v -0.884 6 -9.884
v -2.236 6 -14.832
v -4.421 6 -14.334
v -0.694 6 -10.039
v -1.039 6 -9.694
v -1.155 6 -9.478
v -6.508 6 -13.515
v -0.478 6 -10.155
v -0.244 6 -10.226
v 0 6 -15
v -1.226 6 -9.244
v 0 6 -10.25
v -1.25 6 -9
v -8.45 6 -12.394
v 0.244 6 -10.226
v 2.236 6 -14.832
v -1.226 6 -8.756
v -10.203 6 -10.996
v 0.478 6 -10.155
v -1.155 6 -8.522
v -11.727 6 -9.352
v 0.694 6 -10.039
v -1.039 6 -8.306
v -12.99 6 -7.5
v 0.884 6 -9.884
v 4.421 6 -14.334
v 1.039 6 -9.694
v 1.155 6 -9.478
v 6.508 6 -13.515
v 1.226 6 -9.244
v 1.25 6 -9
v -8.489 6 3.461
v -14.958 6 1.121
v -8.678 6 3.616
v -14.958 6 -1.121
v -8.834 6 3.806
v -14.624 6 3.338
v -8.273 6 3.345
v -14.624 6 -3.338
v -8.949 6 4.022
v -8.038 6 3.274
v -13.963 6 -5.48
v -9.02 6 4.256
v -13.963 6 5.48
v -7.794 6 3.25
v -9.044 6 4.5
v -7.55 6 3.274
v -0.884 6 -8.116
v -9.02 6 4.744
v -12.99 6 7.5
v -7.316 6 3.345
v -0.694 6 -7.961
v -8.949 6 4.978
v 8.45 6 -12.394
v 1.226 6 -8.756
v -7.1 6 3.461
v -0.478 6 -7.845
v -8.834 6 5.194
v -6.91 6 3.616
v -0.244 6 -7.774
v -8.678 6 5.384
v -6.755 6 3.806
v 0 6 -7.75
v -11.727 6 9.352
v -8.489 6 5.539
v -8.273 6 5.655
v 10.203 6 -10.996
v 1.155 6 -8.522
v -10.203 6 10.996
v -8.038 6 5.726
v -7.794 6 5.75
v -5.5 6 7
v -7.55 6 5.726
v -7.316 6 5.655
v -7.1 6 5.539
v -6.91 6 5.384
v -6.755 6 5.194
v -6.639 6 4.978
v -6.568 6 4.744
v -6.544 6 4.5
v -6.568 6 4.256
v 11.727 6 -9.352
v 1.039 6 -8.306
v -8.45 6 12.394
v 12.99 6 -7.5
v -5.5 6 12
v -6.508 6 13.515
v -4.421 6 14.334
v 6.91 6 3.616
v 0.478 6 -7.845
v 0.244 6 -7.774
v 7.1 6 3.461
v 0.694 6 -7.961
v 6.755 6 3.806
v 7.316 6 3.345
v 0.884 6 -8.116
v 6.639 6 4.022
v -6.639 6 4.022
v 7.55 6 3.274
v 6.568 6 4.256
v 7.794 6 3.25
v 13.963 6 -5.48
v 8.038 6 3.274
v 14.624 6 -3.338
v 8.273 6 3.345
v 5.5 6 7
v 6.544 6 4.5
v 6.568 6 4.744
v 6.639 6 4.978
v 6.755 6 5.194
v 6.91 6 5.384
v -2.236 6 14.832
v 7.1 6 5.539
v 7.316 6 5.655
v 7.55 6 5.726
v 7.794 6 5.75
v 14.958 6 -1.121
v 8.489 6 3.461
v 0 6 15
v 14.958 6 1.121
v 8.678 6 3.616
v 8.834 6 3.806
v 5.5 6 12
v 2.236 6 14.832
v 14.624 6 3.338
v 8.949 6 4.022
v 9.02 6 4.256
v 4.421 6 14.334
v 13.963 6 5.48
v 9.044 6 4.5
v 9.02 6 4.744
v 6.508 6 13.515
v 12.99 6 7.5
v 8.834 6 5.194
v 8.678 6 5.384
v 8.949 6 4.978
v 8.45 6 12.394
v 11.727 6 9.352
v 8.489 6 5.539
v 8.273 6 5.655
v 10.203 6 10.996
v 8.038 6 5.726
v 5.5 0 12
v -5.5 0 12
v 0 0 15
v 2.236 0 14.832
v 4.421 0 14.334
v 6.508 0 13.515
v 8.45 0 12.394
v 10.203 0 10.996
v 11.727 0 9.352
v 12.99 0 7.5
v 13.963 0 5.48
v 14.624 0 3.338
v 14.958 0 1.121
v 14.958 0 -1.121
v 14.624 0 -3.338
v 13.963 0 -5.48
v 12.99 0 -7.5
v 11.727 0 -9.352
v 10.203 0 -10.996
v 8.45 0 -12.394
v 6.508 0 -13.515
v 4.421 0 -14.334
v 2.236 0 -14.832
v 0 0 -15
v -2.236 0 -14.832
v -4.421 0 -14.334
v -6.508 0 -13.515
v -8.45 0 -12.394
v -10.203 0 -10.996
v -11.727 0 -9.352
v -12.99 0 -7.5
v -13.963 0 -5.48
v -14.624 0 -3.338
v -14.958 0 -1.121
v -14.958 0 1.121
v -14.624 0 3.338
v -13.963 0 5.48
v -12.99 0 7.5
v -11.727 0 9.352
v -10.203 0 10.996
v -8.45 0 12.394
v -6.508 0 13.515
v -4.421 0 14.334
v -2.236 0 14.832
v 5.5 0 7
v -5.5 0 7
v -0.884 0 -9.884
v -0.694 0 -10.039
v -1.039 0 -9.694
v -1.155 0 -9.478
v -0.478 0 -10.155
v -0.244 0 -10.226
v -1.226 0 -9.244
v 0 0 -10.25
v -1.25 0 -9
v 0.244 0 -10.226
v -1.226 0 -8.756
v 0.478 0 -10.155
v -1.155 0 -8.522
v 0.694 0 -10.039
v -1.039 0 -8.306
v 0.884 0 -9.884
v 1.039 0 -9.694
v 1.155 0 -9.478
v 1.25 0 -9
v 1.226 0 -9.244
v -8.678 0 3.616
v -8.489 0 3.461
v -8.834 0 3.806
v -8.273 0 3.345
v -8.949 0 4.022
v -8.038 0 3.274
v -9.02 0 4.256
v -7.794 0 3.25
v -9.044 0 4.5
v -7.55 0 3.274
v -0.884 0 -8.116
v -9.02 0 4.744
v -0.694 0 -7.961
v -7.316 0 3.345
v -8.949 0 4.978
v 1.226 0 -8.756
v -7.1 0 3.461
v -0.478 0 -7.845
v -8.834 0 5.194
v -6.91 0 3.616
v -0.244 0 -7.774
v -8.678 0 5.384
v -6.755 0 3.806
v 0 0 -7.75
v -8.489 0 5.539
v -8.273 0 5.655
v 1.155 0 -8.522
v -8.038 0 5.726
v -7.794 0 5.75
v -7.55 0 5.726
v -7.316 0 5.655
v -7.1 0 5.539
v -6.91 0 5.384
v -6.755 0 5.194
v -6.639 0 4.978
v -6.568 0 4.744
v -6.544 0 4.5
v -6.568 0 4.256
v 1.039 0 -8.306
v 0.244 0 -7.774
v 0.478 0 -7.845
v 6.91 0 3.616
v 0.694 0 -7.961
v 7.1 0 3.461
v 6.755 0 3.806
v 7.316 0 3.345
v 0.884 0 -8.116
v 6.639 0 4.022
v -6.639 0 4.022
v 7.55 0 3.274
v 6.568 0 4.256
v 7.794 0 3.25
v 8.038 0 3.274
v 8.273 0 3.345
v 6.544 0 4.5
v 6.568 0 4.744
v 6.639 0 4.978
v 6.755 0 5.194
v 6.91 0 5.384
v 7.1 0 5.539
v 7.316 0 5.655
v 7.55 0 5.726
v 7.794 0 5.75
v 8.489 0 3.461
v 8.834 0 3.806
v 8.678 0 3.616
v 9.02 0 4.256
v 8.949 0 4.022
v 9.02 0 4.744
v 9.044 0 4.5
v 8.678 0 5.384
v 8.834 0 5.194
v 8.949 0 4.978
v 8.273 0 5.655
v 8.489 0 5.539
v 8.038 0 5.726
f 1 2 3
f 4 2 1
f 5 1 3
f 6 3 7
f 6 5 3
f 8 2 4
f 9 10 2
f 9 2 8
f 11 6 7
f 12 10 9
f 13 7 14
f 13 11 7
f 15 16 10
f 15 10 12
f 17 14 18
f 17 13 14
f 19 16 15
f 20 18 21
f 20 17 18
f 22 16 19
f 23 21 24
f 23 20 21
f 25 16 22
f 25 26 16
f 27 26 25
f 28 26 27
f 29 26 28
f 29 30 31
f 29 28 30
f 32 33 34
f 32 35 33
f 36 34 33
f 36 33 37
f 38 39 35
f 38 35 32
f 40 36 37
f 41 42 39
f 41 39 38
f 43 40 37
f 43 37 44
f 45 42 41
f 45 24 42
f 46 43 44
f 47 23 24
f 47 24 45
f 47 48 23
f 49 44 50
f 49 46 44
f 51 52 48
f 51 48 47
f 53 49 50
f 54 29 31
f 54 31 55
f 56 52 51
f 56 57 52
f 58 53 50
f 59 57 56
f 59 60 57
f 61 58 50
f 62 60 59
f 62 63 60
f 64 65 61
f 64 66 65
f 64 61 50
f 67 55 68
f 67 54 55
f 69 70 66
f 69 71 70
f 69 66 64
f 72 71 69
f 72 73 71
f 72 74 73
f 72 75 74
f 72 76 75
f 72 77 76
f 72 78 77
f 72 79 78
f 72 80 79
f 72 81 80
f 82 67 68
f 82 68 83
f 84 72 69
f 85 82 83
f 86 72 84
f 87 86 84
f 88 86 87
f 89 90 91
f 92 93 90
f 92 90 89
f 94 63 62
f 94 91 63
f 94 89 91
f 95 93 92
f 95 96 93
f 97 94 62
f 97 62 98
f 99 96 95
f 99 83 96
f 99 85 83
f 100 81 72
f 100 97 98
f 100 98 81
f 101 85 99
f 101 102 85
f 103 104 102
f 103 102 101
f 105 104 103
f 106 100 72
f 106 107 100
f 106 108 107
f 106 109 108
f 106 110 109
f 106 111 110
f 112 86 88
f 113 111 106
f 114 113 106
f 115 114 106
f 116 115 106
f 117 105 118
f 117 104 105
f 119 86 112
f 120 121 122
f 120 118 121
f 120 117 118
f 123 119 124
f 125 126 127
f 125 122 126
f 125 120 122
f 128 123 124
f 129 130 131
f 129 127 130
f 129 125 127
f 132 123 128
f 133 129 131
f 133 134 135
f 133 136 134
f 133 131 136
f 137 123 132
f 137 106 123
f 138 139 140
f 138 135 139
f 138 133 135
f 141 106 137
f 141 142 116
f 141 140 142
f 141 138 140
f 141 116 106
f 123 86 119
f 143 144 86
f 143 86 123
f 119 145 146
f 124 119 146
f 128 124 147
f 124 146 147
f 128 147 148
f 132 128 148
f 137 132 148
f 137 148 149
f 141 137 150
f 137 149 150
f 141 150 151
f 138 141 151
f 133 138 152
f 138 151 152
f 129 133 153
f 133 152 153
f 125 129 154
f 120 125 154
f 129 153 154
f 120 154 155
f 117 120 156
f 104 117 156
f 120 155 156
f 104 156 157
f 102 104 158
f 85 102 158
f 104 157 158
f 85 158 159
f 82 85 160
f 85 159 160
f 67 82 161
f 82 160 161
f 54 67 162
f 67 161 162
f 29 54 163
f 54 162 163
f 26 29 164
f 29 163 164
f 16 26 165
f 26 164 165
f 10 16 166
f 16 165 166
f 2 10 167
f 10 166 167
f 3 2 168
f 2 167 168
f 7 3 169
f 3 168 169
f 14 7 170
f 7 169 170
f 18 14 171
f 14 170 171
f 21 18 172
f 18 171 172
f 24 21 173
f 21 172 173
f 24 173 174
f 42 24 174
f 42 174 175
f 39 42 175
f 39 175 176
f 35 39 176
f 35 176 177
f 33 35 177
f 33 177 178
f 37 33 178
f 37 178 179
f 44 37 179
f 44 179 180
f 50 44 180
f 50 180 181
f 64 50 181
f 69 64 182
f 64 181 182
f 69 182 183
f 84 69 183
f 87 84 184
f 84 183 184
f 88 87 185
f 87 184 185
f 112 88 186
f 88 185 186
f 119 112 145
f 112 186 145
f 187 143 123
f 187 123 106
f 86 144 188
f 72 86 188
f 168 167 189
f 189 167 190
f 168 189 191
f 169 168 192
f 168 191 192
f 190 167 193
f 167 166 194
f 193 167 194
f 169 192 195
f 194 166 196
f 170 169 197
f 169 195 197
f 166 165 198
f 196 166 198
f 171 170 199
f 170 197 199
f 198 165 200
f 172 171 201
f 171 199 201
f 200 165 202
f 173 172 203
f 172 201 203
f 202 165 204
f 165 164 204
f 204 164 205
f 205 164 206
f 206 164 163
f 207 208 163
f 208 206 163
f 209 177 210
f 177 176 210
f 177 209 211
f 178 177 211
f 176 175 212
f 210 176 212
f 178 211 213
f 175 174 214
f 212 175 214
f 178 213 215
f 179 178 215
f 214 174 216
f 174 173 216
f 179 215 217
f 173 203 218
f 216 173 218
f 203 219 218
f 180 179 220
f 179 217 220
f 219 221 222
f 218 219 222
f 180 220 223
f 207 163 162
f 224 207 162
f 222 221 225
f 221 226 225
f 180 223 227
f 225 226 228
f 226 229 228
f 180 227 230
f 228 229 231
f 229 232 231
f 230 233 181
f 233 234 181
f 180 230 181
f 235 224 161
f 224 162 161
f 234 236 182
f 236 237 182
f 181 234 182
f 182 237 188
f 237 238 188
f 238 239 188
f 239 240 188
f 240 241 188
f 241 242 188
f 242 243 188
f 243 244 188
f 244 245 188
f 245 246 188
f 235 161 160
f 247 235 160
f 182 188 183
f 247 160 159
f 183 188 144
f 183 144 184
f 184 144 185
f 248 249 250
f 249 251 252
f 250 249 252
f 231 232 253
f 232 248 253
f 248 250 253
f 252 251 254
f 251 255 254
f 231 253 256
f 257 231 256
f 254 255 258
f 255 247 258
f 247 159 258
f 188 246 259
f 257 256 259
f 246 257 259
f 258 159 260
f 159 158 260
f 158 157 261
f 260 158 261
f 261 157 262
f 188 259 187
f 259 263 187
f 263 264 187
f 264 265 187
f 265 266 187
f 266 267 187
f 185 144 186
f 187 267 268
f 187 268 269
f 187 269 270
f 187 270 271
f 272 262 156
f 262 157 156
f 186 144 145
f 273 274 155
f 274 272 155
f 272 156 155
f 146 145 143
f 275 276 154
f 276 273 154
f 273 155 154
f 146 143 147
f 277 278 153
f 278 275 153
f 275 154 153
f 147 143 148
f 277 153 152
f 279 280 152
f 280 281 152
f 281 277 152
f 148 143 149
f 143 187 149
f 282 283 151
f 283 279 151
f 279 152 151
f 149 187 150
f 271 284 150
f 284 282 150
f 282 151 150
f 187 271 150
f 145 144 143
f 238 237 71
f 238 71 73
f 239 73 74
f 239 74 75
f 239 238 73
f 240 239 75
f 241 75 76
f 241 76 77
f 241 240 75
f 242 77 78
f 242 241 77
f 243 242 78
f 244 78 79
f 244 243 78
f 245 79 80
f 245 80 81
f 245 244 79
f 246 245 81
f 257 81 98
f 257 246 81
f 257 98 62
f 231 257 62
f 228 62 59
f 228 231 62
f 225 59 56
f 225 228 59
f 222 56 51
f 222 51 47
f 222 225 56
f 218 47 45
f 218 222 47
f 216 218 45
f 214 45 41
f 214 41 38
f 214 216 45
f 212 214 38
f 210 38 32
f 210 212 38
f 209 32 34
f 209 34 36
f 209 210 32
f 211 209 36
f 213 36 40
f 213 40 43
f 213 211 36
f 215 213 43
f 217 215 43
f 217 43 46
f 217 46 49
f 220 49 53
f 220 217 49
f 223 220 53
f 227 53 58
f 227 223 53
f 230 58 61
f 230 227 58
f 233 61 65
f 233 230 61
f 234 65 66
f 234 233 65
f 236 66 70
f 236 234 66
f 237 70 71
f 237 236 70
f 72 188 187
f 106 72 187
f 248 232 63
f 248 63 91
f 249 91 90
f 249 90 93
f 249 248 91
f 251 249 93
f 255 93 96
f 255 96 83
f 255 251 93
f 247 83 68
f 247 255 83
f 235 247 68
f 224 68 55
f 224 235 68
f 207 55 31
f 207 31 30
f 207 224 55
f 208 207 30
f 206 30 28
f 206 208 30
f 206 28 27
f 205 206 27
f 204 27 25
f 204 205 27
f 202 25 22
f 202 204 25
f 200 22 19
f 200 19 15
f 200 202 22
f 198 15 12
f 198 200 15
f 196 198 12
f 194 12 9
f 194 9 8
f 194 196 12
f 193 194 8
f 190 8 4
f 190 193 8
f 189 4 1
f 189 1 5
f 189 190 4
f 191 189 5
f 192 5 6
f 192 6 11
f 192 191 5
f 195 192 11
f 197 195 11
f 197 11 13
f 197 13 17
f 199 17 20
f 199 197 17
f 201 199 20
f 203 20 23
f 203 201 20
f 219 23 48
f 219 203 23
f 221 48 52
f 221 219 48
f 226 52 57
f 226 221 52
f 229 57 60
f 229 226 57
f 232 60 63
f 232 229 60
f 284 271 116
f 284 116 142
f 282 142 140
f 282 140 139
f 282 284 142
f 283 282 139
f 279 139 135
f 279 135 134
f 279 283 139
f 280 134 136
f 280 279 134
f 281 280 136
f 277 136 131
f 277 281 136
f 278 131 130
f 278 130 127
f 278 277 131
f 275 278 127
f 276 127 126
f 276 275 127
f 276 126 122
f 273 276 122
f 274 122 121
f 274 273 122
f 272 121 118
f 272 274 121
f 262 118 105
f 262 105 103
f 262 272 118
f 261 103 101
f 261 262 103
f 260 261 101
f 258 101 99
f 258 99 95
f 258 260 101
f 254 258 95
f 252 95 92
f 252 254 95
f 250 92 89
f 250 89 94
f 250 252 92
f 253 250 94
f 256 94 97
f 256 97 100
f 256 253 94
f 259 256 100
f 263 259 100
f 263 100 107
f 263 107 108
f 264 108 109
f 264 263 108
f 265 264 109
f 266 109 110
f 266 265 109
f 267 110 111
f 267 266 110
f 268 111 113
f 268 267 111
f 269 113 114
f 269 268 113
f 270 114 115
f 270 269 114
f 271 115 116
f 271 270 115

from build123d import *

# Parameters (mm, degrees)
SKETCH_1_R      = 15
SKETCH_1_R_2    = 1.25
SKETCH_1_W      = 11
SKETCH_1_H      = 5
EXTRUDE_1_DEPTH = 6


with BuildPart() as part:
    # 草图1 → 凸台-拉伸1 (new body)
    with BuildSketch(Plane(origin=(0, 0, 0), x_dir=(1, 0, 0), z_dir=(0, 1, 0))):
        with Locations(Location((0, 0, 0), (0, 0, 270))):
            Circle(SKETCH_1_R)
        with Locations(Location((0, 9, 0), (0, 0, 270))):
            Circle(SKETCH_1_R_2, mode=Mode.SUBTRACT)
        with Locations(Location((7.794228634, -4.5, 0), (0, 0, 270))):
            Circle(SKETCH_1_R_2, mode=Mode.SUBTRACT)
        with Locations(Location((-7.794228634, -4.5, 0), (0, 0, 270))):
            Circle(SKETCH_1_R_2, mode=Mode.SUBTRACT)
        with Locations((0, -9.5)):
            Rectangle(SKETCH_1_W, SKETCH_1_H, mode=Mode.SUBTRACT)
    extrude(amount=EXTRUDE_1_DEPTH)


solid = part.part
